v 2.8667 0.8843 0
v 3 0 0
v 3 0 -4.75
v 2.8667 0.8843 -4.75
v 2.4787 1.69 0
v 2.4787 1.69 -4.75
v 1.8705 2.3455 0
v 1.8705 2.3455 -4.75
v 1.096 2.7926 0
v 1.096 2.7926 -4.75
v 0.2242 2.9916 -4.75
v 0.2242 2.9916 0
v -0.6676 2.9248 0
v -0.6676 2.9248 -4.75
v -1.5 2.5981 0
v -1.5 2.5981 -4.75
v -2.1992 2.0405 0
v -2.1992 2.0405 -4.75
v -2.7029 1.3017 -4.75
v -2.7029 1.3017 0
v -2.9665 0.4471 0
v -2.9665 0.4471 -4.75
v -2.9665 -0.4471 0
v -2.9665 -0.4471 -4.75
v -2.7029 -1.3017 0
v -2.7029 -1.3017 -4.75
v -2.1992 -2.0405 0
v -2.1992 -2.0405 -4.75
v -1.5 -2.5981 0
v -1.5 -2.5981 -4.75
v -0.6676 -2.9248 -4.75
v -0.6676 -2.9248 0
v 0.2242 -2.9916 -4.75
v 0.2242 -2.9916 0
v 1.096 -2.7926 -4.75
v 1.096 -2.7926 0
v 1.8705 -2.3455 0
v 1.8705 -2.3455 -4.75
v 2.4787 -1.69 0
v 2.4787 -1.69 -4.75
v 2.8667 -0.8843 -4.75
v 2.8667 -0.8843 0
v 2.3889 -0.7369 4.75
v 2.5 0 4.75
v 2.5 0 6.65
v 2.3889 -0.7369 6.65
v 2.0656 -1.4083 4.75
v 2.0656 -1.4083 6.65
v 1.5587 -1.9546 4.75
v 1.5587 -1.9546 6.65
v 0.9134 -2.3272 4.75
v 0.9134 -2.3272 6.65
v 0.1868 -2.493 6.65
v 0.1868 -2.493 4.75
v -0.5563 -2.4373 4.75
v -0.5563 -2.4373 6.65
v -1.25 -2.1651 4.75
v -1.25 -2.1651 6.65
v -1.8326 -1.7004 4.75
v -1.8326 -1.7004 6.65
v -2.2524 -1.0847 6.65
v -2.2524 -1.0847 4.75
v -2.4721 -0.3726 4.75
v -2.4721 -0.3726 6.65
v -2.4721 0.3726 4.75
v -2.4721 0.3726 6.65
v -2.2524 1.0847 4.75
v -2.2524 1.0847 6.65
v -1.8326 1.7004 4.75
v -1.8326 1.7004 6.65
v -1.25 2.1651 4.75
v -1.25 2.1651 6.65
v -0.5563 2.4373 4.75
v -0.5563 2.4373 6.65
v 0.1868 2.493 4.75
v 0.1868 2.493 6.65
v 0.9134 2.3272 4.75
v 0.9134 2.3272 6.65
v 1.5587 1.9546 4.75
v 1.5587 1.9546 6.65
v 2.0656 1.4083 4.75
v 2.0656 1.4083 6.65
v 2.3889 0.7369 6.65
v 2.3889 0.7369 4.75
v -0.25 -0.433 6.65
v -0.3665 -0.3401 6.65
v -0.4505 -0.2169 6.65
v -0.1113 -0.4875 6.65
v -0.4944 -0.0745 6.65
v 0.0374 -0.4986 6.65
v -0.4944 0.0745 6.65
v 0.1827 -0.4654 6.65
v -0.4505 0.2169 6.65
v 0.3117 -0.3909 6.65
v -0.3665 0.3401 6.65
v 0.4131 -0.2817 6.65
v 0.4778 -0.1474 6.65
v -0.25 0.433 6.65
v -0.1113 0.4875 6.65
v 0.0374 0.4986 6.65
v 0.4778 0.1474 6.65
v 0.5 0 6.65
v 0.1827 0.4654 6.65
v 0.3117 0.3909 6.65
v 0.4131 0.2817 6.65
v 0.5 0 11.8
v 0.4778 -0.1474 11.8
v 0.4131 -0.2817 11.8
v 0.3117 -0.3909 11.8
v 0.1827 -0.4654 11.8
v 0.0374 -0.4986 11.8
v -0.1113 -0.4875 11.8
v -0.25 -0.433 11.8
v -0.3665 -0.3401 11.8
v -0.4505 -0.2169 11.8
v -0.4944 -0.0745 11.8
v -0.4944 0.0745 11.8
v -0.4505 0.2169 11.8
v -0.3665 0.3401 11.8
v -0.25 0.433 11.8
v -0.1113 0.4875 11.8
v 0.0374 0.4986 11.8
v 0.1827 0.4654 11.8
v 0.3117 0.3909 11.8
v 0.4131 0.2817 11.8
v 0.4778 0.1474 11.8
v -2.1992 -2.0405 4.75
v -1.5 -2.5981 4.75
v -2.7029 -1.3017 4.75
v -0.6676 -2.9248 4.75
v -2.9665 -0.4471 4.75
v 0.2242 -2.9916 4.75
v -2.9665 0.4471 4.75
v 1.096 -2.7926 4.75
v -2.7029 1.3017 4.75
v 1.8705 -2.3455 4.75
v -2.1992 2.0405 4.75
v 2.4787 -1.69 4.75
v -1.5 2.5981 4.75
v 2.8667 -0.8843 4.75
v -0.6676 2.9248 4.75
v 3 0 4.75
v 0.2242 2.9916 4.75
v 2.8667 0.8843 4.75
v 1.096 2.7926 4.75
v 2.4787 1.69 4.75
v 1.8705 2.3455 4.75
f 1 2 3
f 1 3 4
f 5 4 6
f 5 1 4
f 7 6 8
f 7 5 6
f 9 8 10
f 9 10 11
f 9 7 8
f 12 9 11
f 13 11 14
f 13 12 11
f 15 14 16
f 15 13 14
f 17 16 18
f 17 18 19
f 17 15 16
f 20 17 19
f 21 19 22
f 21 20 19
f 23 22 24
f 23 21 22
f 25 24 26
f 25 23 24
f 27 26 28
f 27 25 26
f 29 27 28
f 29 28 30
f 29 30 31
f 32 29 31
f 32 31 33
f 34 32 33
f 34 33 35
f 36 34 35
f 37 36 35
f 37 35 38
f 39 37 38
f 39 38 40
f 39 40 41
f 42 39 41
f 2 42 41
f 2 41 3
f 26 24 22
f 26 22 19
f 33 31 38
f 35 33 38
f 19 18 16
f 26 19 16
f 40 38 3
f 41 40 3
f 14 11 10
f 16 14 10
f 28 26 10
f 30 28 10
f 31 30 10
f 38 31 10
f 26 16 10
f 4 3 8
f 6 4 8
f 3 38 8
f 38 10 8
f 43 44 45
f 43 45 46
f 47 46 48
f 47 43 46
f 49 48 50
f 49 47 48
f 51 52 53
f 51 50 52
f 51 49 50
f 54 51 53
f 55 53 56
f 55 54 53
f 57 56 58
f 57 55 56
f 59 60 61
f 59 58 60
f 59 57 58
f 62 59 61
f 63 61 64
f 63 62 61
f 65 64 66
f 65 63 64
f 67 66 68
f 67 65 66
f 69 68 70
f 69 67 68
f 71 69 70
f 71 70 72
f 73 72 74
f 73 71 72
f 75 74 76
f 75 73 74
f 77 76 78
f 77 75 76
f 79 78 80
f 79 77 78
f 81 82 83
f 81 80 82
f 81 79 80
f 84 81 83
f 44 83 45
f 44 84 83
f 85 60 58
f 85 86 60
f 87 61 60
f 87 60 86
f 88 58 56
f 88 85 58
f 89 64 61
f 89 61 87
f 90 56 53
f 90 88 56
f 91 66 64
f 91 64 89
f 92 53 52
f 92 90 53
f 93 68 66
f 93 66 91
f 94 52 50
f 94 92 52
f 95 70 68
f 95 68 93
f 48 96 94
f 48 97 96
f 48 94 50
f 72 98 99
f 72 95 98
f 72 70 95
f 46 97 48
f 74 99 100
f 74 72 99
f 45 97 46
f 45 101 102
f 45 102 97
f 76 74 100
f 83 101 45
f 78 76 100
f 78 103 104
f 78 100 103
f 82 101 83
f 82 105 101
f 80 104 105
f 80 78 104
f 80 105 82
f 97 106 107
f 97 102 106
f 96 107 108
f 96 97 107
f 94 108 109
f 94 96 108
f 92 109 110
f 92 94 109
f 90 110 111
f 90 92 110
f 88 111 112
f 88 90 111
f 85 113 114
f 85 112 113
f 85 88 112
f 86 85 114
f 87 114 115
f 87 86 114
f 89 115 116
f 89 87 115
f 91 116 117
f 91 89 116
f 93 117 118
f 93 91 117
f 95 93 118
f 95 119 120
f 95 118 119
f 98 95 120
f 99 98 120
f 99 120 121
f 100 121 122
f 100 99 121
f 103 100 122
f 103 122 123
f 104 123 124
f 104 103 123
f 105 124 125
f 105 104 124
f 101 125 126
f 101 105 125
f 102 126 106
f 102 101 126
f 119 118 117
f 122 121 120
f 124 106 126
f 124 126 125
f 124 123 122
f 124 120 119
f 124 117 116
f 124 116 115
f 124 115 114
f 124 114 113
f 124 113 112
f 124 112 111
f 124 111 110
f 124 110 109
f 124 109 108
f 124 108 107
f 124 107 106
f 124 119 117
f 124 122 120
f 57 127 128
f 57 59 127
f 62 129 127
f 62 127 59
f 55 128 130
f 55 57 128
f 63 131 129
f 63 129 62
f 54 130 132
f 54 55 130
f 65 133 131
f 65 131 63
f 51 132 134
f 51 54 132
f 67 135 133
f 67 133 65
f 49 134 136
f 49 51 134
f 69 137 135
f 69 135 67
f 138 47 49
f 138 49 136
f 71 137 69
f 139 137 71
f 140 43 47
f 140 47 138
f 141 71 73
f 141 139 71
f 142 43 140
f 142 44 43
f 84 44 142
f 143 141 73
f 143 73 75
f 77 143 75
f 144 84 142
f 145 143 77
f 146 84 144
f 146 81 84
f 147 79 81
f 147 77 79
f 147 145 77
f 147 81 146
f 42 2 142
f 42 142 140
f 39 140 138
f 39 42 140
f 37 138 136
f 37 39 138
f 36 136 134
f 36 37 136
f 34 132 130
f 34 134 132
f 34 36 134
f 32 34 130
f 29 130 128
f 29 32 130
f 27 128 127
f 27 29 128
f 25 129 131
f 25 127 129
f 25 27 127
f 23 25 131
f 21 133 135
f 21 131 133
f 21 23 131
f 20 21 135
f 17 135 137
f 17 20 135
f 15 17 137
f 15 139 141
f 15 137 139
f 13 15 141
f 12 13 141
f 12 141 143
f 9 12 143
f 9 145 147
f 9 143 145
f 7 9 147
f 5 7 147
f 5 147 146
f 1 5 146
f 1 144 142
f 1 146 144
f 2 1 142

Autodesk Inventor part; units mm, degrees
ref_plane "YZ Plane" through (0, 0, 0) normal (1, 0, 0) x (0, 1, 0)
ref_plane "XZ Plane" through (0, 0, 0) normal (0, 1, 0) x (-1, 0, 0)
ref_plane "XY Plane" through (0, 0, 0) normal (0, 0, 1) x (1, 0, 0)
sketch "Sketch1" plane through (0, 0, 0) normal (0, 0, 1) x (1, 0, 0)
  circle A0 centre (0, 0) radius 3
  dimension "d0" = 6
extrude "Extrusion1" add sketch "Sketch1" along normal mid plane 9.5
sketch "Sketch2" plane through (0, 0, 4.75) normal (0, 0, 1) x (1, 0, 0)
  circle A0 centre (0, 0) radius 2.5
  dimension "d3" = 5
extrude "Extrusion2" add sketch "Sketch2" along normal blind 1.9
sketch "Sketch3" plane through (0, 0, 6.65) normal (0, 0, 1) x (1, 0, 0)
  circle A0 centre (0, 0) radius 0.5
  dimension "d6" = 1
extrude "Extrusion3" add sketch "Sketch3" along normal blind 5.15
properties part number "FDM0620 Stepper"
